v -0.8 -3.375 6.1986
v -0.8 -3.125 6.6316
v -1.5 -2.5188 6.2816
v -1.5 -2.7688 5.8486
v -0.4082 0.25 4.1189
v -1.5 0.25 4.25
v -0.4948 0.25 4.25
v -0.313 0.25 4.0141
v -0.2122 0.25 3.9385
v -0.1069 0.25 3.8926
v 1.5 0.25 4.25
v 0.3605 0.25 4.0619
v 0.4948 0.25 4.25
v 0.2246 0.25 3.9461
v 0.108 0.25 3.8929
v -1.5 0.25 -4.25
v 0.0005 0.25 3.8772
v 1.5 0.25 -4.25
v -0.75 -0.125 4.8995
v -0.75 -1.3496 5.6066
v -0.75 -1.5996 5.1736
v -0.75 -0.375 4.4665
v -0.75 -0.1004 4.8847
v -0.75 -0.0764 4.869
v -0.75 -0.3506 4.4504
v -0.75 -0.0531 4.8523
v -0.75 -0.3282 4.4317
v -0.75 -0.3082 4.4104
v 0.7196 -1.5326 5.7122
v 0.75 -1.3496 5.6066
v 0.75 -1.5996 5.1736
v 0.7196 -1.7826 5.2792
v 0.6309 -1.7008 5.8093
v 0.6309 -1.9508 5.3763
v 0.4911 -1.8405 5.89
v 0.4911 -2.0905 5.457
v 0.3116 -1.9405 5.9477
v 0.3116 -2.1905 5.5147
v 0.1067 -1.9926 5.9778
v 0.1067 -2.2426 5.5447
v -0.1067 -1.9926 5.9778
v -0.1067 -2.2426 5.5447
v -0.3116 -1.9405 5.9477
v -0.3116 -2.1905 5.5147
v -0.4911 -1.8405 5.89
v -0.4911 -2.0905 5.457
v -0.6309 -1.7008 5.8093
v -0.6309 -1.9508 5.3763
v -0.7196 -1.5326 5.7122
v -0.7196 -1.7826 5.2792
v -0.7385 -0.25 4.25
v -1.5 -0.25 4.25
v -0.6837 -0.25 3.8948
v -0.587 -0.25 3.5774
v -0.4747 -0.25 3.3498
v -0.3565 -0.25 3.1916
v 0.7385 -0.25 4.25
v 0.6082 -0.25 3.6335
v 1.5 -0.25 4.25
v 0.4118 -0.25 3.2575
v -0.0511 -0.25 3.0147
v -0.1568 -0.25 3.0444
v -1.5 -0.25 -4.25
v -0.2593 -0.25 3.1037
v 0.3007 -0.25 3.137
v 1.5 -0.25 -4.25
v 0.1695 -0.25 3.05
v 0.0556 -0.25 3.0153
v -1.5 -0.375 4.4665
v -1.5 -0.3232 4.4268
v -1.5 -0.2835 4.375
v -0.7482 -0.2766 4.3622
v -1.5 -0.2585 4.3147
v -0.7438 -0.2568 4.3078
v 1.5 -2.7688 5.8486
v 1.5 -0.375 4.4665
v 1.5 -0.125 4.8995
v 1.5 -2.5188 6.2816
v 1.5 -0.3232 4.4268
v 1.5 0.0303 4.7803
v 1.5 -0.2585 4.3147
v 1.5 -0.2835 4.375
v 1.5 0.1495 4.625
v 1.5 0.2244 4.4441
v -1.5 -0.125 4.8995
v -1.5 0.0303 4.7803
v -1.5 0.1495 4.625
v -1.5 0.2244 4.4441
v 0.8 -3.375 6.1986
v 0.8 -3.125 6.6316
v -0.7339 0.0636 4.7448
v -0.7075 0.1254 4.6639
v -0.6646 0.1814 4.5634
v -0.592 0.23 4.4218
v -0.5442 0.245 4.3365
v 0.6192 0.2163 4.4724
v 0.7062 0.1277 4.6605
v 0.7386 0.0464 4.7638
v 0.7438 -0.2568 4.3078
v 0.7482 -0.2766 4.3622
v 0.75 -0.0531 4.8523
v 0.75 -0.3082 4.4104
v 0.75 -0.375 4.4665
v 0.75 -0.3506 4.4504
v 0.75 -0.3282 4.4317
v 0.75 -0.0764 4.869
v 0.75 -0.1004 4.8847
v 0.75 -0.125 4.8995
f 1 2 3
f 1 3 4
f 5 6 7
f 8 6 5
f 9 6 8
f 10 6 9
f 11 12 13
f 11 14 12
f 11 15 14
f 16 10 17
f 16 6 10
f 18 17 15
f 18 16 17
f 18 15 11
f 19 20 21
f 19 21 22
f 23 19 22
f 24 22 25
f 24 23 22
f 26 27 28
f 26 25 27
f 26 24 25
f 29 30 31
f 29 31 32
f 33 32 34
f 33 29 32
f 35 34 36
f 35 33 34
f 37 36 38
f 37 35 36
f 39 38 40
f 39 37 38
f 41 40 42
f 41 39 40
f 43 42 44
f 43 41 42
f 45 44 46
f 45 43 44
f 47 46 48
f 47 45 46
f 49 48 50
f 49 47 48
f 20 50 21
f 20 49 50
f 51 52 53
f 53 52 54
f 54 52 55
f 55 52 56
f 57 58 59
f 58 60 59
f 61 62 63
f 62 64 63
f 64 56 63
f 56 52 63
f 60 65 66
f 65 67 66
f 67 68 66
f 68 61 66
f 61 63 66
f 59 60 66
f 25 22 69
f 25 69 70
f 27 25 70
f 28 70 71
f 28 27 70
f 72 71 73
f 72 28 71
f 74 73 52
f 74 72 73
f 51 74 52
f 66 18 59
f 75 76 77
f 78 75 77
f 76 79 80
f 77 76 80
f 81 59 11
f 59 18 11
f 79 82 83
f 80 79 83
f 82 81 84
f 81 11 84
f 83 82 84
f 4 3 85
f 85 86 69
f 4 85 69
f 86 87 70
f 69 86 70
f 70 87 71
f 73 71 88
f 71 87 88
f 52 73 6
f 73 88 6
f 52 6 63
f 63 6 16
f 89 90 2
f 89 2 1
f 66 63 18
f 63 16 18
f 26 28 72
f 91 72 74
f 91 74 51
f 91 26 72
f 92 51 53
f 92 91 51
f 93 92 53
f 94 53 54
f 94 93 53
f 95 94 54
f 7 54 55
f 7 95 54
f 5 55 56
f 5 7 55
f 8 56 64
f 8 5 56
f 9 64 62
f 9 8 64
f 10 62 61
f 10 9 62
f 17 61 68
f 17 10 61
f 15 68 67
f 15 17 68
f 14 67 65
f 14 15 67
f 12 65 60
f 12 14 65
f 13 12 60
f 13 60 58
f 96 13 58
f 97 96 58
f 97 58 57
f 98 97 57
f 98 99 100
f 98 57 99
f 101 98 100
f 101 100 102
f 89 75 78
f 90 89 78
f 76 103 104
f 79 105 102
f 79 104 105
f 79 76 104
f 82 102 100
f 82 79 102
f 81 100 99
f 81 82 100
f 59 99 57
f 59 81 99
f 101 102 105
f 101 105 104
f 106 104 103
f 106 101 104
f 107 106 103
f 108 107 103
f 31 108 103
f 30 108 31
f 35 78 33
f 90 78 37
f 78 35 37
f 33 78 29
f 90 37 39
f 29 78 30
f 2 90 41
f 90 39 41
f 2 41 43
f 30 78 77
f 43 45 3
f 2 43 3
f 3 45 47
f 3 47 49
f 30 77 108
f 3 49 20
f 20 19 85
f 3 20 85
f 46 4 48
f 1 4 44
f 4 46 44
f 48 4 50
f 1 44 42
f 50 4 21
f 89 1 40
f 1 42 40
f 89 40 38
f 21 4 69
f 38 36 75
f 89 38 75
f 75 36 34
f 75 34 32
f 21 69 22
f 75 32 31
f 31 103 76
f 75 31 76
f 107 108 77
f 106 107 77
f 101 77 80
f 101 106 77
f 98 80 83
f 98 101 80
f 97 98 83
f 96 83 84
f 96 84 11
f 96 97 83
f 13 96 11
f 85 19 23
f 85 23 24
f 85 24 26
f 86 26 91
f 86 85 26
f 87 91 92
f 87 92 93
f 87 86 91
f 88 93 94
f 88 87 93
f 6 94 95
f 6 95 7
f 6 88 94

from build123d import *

# Parameters (mm, degrees)
SKETCH1_W           = 3
SKETCH1_H           = 8.5
BOSS_EXTRUDE1_DEPTH = 0.25
SKETCH4_W           = 3
SKETCH4_H           = 0.5
CUT_EXTRUDE1_DEPTH  = 10.548715932
CHAMFER1_SIZE       = 0.7


with BuildPart() as part:
    # Sketch1 → Boss-Extrude1 (new body, symmetric)
    with BuildSketch(Plane(origin=(0, 0, 0), x_dir=(1, 0, 0), z_dir=(0, 1, 0))):
        Rectangle(SKETCH1_W, SKETCH1_H)
    extrude(amount=BOSS_EXTRUDE1_DEPTH, both=True)

    # Sweep1: sweep along a path in Sketch5
    with BuildLine(Plane(origin=(0, 0, 0), x_dir=(0, 0, -1), z_dir=(1, 0, 0))) as sweep1_path:
        Line((-6.415063509, -3.25), (-4.683012702, -0.25))
        ThreePointArc((-4.683012702, -0.25), (-4.5, -0.066987298), (-4.25, 0))
    # Sketch4 → Sweep1 (sweep)
    with BuildSketch(Plane.XY.offset(4.25)):
        Rectangle(SKETCH4_W, SKETCH4_H)
    sweep(path=sweep1_path.line)

    # Sketch6 → Cut-Extrude1 (cut, through all)
    with BuildSketch(Plane(origin=(0, 2.090303983, 3.620512702), x_dir=(1, 0, 0), z_dir=(0, 0.5, 0.866025404))):
        with BuildLine():
            Line((0.75, -2.472114317), (0.75, -3.972114317))
            ThreePointArc((0.75, -3.972114317), (0, -4.722114317), (-0.75, -3.972114317))
            Line((-0.75, -3.972114317), (-0.75, -2.472114317))
            ThreePointArc((-0.75, -2.472114317), (0, -1.722114317), (0.75, -2.472114317))
        make_face()
    extrude(amount=-CUT_EXTRUDE1_DEPTH, mode=Mode.SUBTRACT)

    # Chamfer1
    chamfer1_edges = [part.edges().sort_by_distance(p)[0] for p in [
        (-1.5, -3.25, 6.415063509),
        (1.5, -3.25, 6.415063509),
    ]]
    chamfer(chamfer1_edges, length=CHAMFER1_SIZE)


solid = part.part
